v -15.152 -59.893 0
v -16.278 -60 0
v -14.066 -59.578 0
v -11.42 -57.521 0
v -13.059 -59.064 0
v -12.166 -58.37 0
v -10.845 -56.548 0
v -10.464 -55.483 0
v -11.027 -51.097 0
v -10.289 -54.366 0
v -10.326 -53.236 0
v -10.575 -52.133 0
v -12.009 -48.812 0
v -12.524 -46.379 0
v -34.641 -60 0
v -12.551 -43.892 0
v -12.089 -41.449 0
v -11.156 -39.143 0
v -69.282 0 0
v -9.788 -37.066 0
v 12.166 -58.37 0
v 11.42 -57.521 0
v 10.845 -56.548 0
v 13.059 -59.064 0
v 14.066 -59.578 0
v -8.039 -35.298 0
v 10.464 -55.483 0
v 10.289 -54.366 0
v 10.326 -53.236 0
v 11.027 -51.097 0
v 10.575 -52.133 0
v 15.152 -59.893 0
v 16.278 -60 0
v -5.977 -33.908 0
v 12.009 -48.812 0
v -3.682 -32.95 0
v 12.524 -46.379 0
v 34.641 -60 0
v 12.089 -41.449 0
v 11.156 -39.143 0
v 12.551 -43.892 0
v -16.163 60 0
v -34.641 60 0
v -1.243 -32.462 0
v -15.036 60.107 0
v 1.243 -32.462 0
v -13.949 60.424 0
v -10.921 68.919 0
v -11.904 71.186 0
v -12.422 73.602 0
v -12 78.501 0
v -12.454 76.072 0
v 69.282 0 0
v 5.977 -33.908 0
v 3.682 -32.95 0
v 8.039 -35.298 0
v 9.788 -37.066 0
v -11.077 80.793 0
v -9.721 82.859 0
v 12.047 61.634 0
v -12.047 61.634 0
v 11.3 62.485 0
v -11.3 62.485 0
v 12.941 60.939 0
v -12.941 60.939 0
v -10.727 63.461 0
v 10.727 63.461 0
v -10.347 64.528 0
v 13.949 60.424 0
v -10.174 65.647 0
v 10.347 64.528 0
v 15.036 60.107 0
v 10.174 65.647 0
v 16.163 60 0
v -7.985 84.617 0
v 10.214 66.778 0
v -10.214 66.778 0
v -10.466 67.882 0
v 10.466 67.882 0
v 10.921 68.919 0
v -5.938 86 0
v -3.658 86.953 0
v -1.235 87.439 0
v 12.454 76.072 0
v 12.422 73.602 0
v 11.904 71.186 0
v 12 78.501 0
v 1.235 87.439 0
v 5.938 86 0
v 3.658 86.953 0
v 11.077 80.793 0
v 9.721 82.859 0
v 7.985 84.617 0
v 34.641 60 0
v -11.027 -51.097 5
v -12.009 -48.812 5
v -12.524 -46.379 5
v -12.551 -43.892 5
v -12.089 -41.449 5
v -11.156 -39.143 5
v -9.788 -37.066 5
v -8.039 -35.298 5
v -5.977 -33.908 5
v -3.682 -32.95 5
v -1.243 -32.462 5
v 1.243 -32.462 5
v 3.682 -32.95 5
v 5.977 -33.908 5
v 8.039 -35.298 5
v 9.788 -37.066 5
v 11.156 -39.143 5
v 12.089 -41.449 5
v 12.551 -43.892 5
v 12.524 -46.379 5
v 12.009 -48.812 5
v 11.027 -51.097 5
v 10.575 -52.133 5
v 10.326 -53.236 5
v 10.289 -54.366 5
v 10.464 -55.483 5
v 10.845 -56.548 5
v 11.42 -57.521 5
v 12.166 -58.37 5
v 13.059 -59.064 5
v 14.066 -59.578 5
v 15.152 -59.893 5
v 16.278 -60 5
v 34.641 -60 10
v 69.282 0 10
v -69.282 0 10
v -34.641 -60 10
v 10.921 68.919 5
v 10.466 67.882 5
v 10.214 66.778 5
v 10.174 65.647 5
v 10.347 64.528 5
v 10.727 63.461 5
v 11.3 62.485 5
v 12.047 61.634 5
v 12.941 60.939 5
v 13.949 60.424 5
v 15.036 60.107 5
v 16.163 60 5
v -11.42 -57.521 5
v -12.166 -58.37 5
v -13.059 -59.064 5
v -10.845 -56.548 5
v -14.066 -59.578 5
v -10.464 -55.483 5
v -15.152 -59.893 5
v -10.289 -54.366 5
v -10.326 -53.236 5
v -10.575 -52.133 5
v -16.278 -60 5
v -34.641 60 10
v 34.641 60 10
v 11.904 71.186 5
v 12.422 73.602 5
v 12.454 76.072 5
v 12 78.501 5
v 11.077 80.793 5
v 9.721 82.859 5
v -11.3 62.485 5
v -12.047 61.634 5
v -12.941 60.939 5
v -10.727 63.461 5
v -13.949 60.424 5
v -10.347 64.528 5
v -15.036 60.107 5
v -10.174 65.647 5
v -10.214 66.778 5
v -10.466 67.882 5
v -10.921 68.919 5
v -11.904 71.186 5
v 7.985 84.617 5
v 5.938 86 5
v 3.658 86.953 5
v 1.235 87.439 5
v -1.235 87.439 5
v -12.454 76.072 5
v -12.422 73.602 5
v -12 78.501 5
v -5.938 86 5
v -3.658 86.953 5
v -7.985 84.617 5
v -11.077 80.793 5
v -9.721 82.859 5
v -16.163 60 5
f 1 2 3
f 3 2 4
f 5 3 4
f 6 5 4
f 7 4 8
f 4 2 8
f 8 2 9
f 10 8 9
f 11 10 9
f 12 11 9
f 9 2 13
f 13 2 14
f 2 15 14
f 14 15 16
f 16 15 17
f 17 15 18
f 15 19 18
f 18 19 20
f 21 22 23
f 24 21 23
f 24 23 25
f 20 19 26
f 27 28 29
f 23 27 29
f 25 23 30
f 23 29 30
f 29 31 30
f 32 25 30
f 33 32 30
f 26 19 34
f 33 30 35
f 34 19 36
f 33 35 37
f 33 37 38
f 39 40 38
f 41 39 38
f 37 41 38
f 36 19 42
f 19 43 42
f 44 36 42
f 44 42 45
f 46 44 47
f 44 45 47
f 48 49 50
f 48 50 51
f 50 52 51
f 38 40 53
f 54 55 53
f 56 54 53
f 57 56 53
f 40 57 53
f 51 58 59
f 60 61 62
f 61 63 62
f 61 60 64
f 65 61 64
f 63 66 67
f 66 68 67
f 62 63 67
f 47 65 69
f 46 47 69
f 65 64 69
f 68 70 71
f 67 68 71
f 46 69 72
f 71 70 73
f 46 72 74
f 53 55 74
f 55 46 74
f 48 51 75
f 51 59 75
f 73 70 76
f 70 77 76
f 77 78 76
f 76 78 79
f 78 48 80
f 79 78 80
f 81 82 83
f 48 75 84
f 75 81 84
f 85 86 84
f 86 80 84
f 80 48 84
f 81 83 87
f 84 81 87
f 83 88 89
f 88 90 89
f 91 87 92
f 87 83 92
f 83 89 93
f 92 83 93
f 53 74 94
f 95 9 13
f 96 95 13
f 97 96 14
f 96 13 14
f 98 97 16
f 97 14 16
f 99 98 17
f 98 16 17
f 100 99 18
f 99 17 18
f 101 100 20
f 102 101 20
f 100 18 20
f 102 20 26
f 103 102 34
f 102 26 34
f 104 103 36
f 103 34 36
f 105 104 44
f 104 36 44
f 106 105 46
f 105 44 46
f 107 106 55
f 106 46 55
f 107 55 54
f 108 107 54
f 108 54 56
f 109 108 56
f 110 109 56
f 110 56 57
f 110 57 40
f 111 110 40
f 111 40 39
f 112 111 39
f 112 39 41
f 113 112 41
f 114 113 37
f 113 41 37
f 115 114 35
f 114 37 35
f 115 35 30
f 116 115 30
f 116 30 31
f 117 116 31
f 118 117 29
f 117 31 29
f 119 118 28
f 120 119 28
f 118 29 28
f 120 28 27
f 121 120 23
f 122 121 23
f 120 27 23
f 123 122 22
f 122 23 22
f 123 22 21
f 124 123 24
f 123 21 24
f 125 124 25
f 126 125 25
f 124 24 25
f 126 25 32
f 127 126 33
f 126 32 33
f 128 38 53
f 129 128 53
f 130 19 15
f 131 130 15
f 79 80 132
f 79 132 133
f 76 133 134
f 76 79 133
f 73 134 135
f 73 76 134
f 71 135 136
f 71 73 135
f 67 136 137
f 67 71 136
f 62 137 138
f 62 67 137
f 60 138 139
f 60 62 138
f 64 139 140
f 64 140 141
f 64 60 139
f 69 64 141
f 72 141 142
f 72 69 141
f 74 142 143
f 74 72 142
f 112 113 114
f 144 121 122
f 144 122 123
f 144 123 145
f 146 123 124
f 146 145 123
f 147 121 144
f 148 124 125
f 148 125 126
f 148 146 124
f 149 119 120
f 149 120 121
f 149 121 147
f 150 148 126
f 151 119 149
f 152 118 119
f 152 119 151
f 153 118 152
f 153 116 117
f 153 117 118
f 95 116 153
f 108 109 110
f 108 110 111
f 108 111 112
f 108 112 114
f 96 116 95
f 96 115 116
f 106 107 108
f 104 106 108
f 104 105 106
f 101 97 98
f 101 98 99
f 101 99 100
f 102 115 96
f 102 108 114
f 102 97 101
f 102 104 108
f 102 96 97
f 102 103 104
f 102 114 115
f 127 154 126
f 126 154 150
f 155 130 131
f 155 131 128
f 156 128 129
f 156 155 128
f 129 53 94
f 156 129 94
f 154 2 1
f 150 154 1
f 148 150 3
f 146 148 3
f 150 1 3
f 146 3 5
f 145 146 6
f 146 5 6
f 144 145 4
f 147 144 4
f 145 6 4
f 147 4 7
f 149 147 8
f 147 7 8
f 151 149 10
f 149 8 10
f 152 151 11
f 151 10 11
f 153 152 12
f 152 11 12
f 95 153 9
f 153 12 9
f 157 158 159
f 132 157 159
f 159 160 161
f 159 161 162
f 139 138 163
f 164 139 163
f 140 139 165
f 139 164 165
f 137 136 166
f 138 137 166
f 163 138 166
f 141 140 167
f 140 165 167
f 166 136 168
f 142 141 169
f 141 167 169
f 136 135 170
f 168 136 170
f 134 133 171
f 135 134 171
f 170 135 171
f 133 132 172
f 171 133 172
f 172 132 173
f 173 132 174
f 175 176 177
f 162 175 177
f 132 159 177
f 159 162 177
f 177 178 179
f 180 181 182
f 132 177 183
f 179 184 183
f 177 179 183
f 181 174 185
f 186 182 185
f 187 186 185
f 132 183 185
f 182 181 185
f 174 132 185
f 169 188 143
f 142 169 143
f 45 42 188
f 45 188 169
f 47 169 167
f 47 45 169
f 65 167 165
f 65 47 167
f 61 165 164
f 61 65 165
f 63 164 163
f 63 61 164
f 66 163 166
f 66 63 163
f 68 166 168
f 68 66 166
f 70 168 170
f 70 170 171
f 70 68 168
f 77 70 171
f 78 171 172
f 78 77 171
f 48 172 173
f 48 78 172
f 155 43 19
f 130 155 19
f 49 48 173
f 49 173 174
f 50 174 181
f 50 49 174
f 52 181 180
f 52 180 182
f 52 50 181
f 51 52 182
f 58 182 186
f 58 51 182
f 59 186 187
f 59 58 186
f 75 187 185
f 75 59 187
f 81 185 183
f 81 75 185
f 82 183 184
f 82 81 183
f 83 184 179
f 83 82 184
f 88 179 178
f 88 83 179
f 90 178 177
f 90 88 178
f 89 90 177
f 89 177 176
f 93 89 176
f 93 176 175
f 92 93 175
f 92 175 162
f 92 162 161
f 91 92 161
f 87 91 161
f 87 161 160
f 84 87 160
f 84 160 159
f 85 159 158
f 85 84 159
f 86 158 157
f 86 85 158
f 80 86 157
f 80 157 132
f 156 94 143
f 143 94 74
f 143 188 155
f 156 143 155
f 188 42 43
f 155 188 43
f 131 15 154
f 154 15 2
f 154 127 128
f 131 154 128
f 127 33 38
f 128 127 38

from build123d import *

# Parameters (mm, degrees)
EXTRUDE_1_DEPTH     = 10
EXTRUDE_2_DEPTH     = 5
CUT_EXTRUDE_2_DEPTH = 5


with BuildPart() as part:
    # 草图1 → 凸台-拉伸1 (new body)
    with BuildSketch(Plane.XY):
        Polygon((69.282032303, 0), (34.641016151, 60), (-34.641016151, 60), (-69.282032303, 0), (-34.641016151, -60), (34.641016151, -60), align=None)
    extrude(amount=EXTRUDE_1_DEPTH)

    # 草图2 → 凸台-拉伸2 (add)
    with BuildSketch(Plane(origin=(0, 0, 0), x_dir=(-1, 0, 0), z_dir=(0, 0, -1))):
        with BuildLine():
            Line((-16.163229875, 60), (16.163229875, 60))
            ThreePointArc((16.163229875, 60), (10.9905365, 62.959729742), (10.921101267, 68.918918919))
            ThreePointArc((10.921101267, 68.918918919), (0, 87.5), (-10.921101267, 68.918918919))
            ThreePointArc((-10.921101267, 68.918918919), (-10.9905365, 62.959729742), (-16.163229875, 60))
        make_face()
    extrude(amount=-EXTRUDE_2_DEPTH)

    # 草图3 → 切除-拉伸2 (cut)
    with BuildSketch(Plane(origin=(0, 0, 0), x_dir=(-1, 0, 0), z_dir=(0, 0, -1))):
        with BuildLine():
            ThreePointArc((-11.026755844, -51.096774194), (-11.109451344, -57.048003048), (-16.27759196, -60))
            Line((-16.27759196, -60), (0, -60))
            Line((0, -60), (16.27759196, -60))
            ThreePointArc((16.27759196, -60), (11.109451344, -57.048003048), (11.026755844, -51.096774194))
            ThreePointArc((11.026755844, -51.096774194), (0, -32.4), (-11.026755844, -51.096774194))
        make_face()
    extrude(amount=-CUT_EXTRUDE_2_DEPTH, mode=Mode.SUBTRACT)


solid = part.part
